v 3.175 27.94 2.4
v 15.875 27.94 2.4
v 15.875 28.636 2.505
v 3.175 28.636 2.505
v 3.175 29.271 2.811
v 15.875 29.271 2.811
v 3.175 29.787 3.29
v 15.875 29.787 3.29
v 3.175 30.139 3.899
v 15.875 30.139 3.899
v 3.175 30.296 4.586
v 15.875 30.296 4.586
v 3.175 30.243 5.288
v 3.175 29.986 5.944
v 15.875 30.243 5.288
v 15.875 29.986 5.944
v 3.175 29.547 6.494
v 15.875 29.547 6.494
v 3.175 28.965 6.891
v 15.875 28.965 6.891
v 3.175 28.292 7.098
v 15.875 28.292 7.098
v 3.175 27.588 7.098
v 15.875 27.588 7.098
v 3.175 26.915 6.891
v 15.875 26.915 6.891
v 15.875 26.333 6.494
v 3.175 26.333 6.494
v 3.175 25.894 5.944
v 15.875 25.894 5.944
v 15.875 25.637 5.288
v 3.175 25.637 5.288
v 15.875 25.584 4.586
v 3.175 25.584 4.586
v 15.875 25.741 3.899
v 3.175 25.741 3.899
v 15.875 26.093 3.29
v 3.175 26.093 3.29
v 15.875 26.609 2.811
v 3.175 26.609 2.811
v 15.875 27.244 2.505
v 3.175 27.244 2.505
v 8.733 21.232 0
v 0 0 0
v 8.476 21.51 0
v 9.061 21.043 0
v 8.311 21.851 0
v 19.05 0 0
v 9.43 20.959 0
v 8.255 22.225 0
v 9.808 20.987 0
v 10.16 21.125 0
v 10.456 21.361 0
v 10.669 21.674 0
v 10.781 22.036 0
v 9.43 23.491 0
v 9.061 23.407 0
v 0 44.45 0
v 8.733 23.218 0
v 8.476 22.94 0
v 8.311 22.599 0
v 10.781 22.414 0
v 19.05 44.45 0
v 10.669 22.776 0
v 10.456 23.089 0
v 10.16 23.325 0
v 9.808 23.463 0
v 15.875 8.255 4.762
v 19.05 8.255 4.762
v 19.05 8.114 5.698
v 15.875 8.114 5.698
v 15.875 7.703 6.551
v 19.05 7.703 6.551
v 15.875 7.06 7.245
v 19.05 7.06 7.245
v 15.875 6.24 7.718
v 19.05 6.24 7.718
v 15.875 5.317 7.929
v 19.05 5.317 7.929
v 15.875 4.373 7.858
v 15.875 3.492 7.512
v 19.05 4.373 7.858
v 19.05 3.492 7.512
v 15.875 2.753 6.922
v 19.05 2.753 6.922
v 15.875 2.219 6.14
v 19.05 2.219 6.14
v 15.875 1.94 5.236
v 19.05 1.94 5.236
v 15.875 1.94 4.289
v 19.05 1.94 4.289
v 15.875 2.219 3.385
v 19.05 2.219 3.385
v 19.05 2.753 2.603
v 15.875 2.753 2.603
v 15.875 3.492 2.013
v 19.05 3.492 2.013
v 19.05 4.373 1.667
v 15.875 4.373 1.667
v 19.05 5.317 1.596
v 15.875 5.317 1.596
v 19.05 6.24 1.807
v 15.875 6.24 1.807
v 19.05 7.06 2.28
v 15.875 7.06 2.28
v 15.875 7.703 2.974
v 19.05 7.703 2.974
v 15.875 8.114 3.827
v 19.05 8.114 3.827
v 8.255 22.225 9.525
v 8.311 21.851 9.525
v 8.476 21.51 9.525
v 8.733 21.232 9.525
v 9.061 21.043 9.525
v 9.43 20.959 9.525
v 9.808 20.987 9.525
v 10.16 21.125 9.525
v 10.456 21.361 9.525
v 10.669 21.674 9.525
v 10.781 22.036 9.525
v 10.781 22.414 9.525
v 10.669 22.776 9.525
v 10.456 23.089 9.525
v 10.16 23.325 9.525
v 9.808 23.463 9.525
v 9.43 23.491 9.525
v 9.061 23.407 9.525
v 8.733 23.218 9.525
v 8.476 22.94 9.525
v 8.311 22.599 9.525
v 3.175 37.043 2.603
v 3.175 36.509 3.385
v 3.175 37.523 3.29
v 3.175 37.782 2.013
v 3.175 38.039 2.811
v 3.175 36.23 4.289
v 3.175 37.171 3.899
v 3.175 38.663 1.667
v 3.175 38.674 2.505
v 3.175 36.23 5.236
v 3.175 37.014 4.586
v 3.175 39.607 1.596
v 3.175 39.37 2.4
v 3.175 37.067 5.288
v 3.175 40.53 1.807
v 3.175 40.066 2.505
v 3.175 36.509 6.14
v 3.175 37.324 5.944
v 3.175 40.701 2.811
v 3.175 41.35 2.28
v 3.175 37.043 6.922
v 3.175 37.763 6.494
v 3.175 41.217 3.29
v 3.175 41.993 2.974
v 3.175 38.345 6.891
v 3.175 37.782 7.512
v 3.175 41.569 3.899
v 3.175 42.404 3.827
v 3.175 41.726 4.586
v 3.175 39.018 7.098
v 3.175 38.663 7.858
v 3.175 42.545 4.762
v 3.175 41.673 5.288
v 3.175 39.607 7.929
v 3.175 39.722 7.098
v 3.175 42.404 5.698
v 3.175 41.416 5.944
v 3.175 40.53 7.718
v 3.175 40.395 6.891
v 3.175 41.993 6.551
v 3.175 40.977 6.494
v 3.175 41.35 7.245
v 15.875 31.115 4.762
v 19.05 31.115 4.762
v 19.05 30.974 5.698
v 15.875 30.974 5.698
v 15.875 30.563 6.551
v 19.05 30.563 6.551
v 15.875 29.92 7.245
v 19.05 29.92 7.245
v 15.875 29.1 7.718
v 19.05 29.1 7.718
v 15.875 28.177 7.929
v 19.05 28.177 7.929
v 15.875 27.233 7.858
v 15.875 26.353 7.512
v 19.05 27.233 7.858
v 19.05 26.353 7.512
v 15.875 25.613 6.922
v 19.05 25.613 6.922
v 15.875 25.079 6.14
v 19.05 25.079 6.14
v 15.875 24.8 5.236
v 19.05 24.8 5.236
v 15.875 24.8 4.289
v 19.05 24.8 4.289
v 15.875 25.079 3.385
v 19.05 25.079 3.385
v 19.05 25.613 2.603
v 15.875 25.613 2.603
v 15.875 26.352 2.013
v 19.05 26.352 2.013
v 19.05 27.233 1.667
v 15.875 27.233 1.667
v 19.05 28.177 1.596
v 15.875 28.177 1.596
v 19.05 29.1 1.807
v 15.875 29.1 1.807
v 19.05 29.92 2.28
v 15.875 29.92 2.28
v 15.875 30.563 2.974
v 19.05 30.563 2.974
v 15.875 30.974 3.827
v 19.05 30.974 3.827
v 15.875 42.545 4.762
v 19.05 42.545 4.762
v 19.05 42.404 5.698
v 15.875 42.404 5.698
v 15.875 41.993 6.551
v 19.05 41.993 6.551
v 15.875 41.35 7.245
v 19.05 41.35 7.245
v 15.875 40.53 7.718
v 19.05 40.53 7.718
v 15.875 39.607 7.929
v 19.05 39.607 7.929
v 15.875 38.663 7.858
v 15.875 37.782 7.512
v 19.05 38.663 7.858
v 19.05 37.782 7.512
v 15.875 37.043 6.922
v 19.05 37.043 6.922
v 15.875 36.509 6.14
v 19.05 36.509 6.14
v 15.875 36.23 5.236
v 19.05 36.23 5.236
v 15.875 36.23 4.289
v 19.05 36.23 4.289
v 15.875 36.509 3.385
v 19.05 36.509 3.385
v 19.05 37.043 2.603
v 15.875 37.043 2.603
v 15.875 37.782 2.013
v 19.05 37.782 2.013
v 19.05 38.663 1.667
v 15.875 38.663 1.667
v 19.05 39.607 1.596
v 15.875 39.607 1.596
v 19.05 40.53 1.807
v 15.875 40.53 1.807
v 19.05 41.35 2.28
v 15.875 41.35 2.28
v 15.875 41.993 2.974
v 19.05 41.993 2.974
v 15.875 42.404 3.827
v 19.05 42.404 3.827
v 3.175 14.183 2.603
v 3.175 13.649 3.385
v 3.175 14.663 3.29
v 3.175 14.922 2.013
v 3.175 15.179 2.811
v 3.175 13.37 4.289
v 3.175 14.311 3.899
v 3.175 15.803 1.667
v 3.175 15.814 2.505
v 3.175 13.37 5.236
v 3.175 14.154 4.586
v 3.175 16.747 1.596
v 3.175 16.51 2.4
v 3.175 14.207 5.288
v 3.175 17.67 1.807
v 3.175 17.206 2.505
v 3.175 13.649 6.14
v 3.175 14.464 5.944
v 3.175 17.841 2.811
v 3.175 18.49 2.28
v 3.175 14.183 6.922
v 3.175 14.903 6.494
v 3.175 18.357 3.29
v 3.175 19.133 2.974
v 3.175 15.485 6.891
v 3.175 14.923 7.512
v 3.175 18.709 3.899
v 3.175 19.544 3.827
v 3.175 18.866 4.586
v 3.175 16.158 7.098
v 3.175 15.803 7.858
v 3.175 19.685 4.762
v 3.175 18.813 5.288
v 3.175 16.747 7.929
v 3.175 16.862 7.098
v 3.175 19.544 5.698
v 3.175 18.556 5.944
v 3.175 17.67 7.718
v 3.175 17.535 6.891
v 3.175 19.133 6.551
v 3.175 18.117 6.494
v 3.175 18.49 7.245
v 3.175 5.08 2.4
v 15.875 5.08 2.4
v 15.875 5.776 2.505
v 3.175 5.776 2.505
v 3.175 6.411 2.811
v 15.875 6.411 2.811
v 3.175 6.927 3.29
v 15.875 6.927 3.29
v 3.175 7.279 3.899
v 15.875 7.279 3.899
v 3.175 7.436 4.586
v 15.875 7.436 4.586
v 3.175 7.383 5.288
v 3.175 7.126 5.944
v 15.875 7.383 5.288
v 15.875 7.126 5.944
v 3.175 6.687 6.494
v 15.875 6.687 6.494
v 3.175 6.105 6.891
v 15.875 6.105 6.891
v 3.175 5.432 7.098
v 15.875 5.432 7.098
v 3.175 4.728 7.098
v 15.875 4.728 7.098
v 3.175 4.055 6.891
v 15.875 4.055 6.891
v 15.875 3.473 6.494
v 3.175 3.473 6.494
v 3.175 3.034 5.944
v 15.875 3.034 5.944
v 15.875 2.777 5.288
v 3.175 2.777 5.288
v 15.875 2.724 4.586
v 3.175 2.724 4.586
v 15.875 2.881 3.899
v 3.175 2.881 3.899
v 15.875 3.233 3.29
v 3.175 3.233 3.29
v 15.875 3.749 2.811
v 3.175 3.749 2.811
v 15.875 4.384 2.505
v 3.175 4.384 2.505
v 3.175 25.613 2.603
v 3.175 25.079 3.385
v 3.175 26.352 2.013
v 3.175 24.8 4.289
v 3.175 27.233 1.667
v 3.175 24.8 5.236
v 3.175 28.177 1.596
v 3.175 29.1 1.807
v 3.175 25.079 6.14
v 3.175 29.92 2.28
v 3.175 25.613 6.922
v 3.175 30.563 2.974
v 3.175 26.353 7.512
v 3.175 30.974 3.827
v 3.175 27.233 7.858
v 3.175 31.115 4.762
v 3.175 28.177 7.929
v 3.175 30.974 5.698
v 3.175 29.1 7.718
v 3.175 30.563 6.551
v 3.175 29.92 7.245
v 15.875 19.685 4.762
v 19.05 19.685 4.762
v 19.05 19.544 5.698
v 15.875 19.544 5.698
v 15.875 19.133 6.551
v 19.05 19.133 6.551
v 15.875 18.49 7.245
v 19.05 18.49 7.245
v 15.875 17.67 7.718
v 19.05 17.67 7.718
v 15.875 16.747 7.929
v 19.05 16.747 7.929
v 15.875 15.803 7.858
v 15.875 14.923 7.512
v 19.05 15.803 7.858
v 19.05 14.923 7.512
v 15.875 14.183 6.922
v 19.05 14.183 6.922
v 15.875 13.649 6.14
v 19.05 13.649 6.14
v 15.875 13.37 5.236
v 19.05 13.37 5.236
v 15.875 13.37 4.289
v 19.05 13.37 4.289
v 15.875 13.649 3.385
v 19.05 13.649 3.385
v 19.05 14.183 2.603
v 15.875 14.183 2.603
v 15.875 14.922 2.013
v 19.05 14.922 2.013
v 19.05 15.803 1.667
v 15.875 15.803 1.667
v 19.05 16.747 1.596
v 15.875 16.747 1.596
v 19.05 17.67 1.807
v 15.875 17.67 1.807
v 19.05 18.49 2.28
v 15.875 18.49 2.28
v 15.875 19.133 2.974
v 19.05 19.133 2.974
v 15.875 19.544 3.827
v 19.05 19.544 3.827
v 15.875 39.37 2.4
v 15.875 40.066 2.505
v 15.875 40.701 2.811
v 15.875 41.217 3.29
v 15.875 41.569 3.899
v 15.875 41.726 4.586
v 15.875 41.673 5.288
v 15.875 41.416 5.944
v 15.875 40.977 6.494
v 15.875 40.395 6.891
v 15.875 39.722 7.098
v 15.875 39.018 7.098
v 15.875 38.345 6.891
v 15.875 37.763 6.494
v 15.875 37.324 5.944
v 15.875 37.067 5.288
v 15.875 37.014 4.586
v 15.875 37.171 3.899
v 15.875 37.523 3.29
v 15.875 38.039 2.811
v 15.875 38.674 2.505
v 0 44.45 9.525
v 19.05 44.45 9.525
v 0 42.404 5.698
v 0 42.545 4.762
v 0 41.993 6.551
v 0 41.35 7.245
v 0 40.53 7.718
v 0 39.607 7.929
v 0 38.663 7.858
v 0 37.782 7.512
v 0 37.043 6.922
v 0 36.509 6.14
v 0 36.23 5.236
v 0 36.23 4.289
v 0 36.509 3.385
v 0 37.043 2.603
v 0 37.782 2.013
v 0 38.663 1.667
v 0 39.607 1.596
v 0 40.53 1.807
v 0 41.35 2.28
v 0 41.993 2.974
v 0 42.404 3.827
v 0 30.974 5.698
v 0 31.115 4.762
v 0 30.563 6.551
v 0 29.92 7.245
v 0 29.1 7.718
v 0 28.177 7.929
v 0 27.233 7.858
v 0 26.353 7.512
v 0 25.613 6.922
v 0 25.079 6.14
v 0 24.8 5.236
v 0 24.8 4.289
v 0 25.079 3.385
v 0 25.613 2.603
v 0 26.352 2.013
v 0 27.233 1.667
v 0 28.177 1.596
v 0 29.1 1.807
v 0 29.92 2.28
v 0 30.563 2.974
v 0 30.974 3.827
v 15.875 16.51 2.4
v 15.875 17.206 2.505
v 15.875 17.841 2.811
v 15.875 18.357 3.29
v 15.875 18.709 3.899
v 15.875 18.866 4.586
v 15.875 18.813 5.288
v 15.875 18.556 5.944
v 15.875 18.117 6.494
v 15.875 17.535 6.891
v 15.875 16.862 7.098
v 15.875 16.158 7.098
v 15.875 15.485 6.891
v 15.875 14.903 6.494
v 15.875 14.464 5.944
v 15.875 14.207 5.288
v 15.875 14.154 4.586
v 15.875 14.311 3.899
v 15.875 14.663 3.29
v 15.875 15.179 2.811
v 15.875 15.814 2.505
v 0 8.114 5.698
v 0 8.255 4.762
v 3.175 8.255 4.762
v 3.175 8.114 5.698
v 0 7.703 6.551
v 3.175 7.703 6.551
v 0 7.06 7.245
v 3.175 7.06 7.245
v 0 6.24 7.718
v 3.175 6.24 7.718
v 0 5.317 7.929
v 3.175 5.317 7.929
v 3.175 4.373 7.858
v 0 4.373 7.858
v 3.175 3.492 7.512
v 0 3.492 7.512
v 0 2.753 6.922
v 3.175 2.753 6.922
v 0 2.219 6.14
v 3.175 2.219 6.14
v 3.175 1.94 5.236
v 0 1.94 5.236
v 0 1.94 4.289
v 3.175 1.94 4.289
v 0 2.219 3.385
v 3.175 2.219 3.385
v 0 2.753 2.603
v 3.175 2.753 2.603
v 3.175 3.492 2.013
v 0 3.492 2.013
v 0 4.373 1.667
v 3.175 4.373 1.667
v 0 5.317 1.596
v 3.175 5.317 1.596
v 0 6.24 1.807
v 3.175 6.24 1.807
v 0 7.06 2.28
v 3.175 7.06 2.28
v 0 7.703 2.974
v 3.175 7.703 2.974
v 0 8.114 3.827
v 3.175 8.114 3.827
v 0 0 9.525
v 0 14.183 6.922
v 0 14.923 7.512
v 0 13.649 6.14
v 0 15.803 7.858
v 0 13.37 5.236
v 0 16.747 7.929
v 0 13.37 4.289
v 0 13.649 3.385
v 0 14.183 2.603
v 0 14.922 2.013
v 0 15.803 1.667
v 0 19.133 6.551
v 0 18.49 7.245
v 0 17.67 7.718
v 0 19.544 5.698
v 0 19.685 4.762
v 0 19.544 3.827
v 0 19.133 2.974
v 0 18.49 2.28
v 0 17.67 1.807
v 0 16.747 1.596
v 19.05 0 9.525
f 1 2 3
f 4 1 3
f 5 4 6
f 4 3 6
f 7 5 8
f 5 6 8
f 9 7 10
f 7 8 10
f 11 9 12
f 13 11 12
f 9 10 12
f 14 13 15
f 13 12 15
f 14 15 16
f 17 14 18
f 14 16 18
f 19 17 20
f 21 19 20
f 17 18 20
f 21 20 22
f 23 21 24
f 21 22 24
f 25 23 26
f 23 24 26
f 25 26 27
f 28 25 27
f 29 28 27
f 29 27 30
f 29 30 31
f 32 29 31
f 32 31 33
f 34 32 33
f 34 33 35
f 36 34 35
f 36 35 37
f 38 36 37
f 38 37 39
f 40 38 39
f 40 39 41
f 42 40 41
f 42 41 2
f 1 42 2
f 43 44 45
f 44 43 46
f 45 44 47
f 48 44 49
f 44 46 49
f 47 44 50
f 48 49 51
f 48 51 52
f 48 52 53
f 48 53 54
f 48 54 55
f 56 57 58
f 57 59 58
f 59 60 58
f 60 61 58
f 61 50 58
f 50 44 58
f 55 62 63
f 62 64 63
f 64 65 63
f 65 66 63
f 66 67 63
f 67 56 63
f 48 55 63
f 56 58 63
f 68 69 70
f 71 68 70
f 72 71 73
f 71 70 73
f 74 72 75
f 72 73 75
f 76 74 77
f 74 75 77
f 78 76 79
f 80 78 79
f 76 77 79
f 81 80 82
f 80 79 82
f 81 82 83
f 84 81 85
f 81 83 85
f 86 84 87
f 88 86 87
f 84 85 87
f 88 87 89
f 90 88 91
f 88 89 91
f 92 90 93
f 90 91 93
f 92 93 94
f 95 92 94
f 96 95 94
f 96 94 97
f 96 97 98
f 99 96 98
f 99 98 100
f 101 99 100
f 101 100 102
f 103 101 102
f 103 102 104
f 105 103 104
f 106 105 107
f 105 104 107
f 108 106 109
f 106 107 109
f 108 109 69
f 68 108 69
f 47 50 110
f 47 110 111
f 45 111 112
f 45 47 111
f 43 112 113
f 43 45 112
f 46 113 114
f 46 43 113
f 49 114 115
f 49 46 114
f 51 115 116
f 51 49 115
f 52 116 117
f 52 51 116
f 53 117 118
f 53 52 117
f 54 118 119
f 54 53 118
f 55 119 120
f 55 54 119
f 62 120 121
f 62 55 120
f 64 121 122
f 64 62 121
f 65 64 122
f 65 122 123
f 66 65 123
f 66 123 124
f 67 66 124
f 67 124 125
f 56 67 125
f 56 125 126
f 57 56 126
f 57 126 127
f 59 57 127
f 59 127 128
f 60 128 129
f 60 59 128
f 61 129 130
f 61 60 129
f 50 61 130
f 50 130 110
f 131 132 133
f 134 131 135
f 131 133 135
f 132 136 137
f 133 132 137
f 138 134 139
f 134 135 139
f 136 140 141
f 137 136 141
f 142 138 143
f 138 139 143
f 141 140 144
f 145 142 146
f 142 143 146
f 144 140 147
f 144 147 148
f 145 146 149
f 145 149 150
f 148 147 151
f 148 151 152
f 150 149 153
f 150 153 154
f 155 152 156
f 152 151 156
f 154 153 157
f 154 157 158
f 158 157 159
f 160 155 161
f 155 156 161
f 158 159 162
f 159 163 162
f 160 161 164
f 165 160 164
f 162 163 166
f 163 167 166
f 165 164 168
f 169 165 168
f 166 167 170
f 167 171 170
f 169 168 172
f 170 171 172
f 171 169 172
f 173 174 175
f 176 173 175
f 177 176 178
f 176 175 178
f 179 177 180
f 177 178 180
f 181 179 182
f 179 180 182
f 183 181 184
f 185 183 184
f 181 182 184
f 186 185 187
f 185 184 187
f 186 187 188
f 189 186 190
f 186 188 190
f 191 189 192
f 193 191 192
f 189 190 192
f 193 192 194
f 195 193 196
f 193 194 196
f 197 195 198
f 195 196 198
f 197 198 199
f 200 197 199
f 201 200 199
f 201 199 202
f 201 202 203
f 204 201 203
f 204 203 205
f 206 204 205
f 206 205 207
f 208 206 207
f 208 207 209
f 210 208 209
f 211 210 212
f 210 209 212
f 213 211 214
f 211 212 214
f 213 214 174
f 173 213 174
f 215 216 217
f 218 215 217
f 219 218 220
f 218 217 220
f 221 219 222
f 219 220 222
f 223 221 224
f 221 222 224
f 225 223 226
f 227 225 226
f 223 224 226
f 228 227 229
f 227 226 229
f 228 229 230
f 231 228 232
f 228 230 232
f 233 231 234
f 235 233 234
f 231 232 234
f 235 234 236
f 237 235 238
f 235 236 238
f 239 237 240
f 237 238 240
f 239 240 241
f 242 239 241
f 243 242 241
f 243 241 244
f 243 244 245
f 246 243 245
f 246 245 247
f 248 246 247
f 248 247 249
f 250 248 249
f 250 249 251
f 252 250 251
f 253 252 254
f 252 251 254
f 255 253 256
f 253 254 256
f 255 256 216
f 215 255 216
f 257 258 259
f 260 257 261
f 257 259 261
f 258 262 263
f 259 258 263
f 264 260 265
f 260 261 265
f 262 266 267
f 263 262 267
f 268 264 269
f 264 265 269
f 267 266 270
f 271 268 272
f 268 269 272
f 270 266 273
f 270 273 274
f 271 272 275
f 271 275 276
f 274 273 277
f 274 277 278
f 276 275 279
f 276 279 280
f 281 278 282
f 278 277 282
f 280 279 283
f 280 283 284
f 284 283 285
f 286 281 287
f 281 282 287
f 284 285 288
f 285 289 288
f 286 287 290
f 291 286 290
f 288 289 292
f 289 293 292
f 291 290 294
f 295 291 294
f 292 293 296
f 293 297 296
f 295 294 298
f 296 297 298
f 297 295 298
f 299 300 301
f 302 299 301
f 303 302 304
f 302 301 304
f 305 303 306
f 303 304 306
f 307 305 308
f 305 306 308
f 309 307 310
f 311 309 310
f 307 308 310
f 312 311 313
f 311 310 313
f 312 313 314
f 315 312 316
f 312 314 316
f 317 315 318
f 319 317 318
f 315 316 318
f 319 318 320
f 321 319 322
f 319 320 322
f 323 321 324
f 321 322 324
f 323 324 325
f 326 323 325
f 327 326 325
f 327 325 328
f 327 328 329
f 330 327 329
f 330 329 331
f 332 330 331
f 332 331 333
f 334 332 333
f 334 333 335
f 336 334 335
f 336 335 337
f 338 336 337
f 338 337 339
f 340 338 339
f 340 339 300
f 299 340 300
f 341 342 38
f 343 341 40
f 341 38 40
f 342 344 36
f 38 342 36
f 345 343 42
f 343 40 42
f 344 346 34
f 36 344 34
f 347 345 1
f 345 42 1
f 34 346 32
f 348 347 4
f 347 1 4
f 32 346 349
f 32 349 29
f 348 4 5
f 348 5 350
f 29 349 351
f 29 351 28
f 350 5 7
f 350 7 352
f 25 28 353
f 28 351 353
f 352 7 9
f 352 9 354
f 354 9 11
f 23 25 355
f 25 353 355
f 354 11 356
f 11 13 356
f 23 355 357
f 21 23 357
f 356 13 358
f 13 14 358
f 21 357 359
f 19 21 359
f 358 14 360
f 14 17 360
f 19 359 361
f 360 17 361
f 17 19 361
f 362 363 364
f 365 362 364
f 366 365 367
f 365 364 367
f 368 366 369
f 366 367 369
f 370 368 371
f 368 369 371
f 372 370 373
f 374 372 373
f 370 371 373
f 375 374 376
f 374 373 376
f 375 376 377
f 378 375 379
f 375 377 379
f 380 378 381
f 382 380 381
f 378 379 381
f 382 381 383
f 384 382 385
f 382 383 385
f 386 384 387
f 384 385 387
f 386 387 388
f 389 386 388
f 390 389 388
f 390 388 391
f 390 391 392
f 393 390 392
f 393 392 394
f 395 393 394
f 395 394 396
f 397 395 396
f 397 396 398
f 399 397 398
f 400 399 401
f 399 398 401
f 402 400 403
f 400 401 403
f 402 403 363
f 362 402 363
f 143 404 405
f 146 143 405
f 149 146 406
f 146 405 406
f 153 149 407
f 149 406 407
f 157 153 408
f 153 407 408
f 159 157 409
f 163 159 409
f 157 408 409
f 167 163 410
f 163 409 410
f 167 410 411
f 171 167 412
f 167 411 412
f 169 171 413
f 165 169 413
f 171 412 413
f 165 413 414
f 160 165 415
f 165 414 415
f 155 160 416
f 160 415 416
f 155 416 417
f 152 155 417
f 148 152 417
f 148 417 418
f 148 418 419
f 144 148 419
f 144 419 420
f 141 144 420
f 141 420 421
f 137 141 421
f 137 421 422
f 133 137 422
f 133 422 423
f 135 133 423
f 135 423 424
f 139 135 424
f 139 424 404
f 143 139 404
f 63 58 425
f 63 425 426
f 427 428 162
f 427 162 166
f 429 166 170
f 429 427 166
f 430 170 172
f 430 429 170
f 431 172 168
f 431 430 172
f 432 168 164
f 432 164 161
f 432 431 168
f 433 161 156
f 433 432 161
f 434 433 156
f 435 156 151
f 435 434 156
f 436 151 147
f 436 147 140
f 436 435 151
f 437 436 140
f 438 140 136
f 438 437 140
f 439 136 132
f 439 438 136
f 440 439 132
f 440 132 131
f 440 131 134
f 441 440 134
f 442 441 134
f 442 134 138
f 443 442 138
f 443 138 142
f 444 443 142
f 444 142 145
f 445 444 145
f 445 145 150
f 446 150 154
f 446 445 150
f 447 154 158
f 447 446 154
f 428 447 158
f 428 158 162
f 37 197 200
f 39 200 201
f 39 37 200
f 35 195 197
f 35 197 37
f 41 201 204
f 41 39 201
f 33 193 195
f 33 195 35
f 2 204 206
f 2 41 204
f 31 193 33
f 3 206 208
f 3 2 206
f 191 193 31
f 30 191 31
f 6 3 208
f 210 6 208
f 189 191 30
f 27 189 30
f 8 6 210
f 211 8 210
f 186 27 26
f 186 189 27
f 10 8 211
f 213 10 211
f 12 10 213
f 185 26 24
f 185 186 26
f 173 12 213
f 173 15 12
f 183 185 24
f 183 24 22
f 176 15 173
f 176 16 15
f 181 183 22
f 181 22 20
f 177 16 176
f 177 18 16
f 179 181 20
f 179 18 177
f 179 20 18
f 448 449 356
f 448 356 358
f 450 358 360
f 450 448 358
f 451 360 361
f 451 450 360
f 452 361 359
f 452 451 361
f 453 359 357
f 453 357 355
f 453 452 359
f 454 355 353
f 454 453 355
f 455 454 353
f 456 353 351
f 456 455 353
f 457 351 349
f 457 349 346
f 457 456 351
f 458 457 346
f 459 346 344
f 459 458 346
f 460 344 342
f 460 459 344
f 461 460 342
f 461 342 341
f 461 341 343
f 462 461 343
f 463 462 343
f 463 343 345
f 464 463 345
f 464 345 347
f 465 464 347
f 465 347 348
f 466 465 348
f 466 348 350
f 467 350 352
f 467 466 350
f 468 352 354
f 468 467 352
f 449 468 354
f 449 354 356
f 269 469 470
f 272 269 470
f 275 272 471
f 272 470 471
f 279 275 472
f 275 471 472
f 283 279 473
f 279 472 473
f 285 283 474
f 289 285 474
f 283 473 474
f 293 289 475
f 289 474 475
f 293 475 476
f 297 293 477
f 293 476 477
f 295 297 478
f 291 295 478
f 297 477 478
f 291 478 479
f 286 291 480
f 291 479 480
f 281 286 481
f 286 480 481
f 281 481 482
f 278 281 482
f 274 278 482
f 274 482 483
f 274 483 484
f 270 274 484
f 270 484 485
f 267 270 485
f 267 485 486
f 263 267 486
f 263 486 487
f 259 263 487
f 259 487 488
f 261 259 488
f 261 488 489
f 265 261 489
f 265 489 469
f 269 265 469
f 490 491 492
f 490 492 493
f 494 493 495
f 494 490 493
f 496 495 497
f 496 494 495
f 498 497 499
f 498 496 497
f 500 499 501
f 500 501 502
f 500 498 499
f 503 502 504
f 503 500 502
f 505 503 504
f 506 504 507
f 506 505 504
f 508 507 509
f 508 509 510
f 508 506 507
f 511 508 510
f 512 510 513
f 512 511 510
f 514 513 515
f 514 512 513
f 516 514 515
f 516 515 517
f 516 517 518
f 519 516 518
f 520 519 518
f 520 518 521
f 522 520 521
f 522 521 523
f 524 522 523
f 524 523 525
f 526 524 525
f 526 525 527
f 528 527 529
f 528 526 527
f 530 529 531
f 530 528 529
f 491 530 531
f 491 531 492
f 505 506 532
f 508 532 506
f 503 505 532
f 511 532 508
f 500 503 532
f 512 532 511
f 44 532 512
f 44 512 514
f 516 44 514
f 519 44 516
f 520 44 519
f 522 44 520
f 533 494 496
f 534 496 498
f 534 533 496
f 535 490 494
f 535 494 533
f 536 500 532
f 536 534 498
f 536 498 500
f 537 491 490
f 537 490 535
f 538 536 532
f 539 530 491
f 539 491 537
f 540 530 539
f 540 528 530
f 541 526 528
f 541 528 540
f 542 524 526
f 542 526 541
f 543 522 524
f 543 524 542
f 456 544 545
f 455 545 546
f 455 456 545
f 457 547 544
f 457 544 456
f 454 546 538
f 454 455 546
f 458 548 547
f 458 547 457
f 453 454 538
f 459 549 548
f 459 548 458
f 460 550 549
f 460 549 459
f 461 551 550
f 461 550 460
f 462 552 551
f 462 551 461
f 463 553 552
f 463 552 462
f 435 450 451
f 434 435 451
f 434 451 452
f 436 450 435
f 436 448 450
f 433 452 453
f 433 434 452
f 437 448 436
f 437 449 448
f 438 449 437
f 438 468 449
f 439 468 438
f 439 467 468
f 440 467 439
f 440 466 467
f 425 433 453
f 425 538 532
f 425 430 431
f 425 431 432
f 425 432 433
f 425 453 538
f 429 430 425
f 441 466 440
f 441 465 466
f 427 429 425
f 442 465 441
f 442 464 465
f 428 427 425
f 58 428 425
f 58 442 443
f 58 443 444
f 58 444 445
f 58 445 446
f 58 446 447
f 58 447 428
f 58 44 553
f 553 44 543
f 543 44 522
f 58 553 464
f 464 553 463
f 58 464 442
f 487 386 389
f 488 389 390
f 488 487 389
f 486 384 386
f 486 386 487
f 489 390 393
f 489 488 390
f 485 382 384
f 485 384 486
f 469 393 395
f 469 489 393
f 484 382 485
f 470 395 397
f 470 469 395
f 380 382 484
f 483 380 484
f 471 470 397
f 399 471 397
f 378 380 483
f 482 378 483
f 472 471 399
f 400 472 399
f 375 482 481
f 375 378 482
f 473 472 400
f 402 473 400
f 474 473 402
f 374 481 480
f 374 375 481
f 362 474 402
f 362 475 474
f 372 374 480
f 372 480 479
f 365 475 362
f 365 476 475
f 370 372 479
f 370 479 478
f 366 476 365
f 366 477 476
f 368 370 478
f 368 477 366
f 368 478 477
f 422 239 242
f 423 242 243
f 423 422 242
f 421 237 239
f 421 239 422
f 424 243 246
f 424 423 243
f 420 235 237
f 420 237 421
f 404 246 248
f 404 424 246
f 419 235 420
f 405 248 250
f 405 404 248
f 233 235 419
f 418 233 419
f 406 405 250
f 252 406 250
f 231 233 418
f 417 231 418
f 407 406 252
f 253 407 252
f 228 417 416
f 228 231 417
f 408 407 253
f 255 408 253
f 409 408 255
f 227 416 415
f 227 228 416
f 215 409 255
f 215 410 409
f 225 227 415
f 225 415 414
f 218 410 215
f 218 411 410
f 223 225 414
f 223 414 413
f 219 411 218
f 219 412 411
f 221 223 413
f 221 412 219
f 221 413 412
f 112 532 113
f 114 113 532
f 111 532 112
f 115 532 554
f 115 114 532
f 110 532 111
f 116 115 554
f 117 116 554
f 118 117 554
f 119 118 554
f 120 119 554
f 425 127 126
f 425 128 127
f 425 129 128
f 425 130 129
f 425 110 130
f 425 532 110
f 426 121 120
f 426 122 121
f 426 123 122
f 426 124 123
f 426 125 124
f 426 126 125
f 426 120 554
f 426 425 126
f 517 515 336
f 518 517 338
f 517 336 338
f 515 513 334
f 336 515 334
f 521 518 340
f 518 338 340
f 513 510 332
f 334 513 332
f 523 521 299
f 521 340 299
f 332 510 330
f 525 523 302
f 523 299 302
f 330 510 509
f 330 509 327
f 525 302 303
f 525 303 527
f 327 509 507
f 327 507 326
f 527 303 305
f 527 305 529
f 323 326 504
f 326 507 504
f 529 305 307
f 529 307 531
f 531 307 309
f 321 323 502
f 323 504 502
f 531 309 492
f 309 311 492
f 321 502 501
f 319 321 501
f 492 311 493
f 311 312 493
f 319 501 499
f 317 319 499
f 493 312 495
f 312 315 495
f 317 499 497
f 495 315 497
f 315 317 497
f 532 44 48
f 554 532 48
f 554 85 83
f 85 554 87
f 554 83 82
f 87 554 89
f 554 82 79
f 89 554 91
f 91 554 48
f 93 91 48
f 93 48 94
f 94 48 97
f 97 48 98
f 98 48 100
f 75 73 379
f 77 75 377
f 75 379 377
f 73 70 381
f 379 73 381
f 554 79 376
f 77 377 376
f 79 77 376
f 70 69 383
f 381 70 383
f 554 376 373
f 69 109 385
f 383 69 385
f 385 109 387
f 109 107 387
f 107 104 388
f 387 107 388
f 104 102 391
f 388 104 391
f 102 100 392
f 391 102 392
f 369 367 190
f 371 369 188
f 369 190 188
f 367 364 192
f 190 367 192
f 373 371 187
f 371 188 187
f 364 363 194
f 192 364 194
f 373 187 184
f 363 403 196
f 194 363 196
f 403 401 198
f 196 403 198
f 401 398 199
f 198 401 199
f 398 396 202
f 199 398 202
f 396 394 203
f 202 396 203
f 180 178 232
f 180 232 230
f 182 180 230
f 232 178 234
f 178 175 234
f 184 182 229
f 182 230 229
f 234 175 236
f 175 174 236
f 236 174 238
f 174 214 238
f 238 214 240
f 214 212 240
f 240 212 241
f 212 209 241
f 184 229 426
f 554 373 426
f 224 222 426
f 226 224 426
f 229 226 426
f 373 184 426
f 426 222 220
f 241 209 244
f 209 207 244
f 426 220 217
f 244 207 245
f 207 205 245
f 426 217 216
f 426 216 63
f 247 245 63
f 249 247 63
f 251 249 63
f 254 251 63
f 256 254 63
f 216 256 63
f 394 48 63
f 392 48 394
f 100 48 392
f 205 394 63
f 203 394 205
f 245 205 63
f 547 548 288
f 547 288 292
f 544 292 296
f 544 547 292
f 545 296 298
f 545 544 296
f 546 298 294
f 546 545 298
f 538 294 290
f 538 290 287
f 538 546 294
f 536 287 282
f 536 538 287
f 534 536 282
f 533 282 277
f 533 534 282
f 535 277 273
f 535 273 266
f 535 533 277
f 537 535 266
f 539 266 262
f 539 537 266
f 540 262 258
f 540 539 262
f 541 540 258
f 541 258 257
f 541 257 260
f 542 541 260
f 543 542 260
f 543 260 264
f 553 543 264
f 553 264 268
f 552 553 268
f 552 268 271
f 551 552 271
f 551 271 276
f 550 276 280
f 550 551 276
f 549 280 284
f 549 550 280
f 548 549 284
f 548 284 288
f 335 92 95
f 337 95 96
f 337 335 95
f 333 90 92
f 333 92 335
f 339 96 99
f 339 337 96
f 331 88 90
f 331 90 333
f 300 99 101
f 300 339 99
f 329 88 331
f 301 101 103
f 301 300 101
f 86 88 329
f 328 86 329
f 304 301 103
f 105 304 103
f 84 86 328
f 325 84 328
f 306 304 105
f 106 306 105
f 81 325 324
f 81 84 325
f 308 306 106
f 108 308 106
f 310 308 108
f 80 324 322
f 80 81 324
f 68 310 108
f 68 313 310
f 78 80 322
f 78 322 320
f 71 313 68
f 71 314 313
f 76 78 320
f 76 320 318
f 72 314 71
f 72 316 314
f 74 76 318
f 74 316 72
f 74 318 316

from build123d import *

# Parameters (mm, degrees)
SKETCH1_W           = 19.05
SKETCH1_H           = 44.45
SKETCH1_R           = 1.27
BOSS_EXTRUDE1_DEPTH = 9.525
SKETCH2_R           = 2.3622
CUT_EXTRUDE1_DEPTH  = 50.289254661
SKETCH5_R           = 3.175
SKETCH5_R_2         = 2.3622
CUT_EXTRUDE2_DEPTH  = 3.175


with BuildPart() as part:
    # Sketch1 → Boss-Extrude1 (new body)
    with BuildSketch(Plane.XY):
        with Locations((9.525, 22.225)):
            Rectangle(SKETCH1_W, SKETCH1_H)
        with Locations(Location((9.525, 22.225, 0), (0, 0, 180))):
            Circle(SKETCH1_R, mode=Mode.SUBTRACT)
    extrude(amount=BOSS_EXTRUDE1_DEPTH)

    # Sketch2 → Cut-Extrude1 (cut, through all)
    with BuildSketch(Plane(origin=(19.05, 0, 0), x_dir=(0, 0, -1), z_dir=(1, 0, 0))):
        with Locations((-4.7625, 16.51)):
            Circle(SKETCH2_R)
        with Locations((-4.7625, 39.37)):
            Circle(SKETCH2_R)
        with Locations((-4.7625, 27.94)):
            Circle(SKETCH2_R)
        with Locations((-4.7625, 5.08)):
            Circle(SKETCH2_R)
    extrude(amount=-CUT_EXTRUDE1_DEPTH, mode=Mode.SUBTRACT)

    # Sketch5 → Cut-Extrude2 (cut)
    # profile 1 of 4: a face of its own
    with BuildSketch(Plane(origin=(19.05, 0, 0), x_dir=(0, 0, -1), z_dir=(1, 0, 0))):
        with Locations(Location((-4.7625, 5.08, 0), (0, 0, 90))):
            Circle(SKETCH5_R)
        with Locations((-4.7625, 5.08)):
            Circle(SKETCH5_R_2, mode=Mode.SUBTRACT)
    # profile 2 of 4: a face of its own
    with BuildSketch(Plane(origin=(19.05, 0, 0), x_dir=(0, 0, -1), z_dir=(1, 0, 0))):
        with Locations(Location((-4.7625, 16.51, 0), (0, 0, 90))):
            Circle(SKETCH5_R)
        with Locations((-4.7625, 16.51)):
            Circle(SKETCH5_R_2, mode=Mode.SUBTRACT)
    # profile 3 of 4: a face of its own
    with BuildSketch(Plane(origin=(19.05, 0, 0), x_dir=(0, 0, -1), z_dir=(1, 0, 0))):
        with Locations(Location((-4.7625, 27.94, 0), (0, 0, 90))):
            Circle(SKETCH5_R)
        with Locations((-4.7625, 27.94)):
            Circle(SKETCH5_R_2, mode=Mode.SUBTRACT)
    # profile 4 of 4: a face of its own
    with BuildSketch(Plane(origin=(19.05, 0, 0), x_dir=(0, 0, -1), z_dir=(1, 0, 0))):
        with Locations(Location((-4.7625, 39.37, 0), (0, 0, 90))):
            Circle(SKETCH5_R)
        with Locations((-4.7625, 39.37)):
            Circle(SKETCH5_R_2, mode=Mode.SUBTRACT)
    cut_extrude2 = extrude(amount=-CUT_EXTRUDE2_DEPTH, mode=Mode.SUBTRACT)

    # Mirror1: Cut-Extrude2 across plane
    add(cut_extrude2.mirror(Plane(origin=(9.525, 0, 0), x_dir=(0, 0, 1), z_dir=(1, 0, 0))), mode=Mode.SUBTRACT)


solid = part.part
